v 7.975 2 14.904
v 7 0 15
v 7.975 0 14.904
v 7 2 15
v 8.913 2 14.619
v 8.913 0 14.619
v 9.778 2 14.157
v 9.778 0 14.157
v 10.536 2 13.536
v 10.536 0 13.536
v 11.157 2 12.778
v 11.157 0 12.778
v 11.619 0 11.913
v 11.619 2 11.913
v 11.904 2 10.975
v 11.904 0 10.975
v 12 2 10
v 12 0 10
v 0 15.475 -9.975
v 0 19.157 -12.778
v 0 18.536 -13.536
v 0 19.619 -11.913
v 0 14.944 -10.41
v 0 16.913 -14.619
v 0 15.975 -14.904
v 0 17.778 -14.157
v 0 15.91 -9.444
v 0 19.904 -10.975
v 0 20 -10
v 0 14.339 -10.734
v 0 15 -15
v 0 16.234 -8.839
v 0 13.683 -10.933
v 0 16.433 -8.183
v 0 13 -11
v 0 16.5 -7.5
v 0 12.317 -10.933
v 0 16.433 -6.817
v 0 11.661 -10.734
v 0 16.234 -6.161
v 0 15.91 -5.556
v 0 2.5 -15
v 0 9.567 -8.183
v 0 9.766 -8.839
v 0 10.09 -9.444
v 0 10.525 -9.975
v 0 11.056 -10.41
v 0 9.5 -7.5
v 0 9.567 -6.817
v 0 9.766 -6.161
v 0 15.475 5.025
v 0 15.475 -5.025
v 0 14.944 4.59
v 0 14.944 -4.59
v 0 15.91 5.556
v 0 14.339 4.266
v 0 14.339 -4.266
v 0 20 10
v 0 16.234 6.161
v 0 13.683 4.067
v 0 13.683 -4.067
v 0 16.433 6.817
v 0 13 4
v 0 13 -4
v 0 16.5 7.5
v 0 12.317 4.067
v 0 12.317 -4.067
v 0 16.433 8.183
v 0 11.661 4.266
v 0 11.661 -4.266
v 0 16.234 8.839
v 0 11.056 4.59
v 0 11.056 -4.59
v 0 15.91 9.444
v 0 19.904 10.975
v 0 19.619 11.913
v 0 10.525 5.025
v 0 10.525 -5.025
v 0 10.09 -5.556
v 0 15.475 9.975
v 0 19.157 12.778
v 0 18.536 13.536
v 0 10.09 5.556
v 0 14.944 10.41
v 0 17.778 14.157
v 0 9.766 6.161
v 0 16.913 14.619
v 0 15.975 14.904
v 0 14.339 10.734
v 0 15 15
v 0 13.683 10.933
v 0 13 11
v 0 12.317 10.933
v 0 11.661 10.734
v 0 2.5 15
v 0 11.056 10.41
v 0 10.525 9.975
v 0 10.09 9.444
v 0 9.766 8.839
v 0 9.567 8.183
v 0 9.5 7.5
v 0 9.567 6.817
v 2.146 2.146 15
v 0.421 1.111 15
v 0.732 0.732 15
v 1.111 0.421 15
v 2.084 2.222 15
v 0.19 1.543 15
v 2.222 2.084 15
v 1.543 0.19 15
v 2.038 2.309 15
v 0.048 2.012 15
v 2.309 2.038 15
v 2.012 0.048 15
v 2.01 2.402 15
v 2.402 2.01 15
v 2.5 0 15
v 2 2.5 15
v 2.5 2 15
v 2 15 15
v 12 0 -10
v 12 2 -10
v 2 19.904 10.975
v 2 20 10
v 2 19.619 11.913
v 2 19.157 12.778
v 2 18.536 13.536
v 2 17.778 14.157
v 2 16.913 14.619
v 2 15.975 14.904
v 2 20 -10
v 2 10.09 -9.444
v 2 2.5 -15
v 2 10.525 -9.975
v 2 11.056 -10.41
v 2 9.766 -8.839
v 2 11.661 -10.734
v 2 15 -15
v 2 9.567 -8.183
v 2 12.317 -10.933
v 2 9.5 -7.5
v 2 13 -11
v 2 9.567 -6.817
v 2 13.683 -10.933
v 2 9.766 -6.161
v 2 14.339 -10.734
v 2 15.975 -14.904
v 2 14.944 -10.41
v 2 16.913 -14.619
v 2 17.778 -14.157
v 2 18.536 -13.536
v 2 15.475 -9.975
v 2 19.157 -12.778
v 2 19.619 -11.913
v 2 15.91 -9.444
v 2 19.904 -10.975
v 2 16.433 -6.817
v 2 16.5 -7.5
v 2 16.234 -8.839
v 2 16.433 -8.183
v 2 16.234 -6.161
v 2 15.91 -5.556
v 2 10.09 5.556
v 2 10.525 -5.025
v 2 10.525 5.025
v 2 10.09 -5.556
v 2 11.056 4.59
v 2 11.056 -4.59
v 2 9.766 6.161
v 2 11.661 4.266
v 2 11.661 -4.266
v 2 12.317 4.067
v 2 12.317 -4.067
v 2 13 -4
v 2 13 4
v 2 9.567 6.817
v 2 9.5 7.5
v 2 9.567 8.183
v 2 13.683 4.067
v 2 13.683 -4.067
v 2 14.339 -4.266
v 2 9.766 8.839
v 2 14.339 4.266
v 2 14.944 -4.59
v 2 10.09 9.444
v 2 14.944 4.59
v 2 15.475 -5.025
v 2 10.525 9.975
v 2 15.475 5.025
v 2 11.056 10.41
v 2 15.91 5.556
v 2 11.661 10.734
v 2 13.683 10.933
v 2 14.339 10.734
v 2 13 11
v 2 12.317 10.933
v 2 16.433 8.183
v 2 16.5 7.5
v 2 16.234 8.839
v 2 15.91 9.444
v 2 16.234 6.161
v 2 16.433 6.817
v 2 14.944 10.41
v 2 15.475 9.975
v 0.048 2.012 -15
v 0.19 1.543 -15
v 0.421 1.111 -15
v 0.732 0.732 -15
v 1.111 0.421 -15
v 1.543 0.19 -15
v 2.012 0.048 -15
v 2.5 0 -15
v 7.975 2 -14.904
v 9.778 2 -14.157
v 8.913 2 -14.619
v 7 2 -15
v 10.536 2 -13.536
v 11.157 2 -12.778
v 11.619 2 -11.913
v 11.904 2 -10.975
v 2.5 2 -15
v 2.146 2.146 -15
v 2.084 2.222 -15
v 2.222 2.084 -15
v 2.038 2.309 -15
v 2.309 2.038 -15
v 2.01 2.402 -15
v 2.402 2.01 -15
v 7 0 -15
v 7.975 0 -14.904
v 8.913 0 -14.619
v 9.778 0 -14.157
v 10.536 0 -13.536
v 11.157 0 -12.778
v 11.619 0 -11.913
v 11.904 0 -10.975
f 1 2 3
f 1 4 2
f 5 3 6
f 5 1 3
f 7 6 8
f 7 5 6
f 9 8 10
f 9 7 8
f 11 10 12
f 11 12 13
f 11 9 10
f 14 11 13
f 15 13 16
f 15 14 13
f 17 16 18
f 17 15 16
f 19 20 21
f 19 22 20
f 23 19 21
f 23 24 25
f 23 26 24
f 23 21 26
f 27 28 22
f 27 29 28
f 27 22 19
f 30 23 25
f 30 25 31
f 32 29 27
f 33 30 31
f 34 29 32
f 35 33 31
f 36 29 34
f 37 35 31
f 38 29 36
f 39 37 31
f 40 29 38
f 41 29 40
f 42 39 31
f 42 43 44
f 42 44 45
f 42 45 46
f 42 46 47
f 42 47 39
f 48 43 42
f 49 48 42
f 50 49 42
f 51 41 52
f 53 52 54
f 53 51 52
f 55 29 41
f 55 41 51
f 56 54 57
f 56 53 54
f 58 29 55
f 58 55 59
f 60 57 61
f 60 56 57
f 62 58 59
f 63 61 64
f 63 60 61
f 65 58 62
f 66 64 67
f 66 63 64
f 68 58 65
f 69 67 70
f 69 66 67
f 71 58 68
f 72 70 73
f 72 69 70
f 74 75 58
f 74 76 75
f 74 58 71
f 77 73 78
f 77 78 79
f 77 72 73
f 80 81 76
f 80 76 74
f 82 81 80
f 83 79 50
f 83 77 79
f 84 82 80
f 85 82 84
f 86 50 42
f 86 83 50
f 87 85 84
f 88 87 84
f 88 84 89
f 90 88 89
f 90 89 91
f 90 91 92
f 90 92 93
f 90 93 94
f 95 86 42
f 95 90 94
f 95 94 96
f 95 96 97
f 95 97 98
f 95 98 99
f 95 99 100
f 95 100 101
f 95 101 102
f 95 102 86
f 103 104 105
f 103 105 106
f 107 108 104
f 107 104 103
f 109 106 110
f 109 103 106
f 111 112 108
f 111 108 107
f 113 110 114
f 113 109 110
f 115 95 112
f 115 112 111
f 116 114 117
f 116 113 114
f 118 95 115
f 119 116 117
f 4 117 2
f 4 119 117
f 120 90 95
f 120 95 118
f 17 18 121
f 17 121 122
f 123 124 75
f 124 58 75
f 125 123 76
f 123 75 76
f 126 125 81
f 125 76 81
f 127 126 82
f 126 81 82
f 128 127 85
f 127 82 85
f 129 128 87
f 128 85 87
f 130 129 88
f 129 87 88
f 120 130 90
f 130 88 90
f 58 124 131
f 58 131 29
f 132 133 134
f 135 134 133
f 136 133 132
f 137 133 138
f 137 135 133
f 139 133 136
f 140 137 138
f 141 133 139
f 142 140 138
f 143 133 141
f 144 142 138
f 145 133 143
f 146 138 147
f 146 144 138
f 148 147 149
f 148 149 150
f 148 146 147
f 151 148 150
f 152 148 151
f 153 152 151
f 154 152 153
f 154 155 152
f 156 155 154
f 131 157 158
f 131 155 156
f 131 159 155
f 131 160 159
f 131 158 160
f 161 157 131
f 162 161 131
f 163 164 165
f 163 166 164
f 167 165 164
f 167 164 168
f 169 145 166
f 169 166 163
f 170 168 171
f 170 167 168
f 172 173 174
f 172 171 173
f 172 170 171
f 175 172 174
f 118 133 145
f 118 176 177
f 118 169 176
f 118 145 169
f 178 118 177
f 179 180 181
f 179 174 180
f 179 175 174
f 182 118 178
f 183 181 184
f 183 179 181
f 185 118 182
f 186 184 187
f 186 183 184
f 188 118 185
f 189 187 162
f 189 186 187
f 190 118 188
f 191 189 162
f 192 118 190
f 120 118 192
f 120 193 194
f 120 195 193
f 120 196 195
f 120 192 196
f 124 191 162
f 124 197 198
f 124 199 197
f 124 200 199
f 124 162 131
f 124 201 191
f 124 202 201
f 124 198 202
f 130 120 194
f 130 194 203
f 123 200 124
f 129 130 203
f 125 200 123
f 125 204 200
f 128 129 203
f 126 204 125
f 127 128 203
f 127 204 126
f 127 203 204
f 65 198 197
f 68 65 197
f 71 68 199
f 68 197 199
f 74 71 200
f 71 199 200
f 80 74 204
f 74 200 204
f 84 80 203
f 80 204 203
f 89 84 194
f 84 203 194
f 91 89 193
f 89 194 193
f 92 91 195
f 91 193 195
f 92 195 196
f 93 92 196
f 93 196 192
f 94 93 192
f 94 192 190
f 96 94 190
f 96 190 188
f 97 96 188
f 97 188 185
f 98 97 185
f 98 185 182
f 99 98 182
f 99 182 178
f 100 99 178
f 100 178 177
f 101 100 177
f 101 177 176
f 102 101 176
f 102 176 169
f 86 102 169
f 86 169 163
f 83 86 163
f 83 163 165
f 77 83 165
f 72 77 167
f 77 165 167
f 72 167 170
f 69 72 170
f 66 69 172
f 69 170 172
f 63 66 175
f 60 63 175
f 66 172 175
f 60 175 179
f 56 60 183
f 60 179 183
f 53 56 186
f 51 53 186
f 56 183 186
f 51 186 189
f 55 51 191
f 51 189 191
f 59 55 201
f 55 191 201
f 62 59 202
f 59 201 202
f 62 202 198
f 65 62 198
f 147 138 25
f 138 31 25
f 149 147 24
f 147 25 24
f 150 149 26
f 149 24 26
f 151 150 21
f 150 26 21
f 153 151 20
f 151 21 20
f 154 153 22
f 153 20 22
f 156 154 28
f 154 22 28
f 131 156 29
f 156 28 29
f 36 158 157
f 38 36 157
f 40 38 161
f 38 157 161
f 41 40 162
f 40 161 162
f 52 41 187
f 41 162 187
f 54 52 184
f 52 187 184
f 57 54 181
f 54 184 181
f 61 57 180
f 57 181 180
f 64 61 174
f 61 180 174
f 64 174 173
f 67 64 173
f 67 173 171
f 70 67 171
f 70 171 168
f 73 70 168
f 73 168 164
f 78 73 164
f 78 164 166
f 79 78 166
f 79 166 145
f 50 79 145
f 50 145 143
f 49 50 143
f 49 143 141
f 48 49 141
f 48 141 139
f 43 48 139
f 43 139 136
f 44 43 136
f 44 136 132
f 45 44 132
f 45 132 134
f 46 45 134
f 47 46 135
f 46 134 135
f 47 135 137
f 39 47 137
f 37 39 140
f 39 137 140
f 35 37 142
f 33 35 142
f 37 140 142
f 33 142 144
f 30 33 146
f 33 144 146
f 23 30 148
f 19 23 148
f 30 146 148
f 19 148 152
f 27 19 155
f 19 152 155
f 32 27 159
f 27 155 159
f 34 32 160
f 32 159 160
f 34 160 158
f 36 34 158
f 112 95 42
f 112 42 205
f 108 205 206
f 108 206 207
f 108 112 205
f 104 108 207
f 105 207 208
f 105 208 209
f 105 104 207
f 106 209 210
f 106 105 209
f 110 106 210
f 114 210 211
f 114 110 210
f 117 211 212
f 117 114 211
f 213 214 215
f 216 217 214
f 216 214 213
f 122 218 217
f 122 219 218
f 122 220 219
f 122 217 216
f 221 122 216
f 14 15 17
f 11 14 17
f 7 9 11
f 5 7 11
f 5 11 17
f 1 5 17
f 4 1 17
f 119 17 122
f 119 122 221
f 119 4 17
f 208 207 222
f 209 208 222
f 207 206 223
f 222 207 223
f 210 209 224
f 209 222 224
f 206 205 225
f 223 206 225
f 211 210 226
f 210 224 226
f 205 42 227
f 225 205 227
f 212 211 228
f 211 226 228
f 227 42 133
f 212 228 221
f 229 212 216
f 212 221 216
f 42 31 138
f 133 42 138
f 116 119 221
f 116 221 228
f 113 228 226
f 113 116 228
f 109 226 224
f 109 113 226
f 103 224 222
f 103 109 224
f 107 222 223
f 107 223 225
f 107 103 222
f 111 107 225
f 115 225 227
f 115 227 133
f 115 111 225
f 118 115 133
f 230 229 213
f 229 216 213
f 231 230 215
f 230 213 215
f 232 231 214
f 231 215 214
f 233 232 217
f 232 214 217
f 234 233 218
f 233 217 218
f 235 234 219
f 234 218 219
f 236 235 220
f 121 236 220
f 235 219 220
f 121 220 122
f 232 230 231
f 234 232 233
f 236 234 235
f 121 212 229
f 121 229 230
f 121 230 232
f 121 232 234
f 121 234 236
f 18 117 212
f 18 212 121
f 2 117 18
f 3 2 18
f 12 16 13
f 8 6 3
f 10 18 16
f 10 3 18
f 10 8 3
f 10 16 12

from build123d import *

# Parameters (mm, degrees)
SM_BASE_FLANGE_1_DEPTH = 15
CUT_EXTRUDE_1_REACH    = 28.926
SKETCH_3_R             = 3.5
FILLET_1_R             = 5


# Sheet-metal steps are written as plain solids
with BuildPart() as part:
    # Sketch 1 → 基体-法兰1 (new, symmetric)
    with BuildSketch(Plane.XY):
        with BuildLine():
            Line((0, 20), (0, 2.5))
            ThreePointArc((0, 2.5), (0.732233047, 0.732233047), (2.5, 0))
            Line((2.5, 0), (12, 0))
            Line((12, 0), (12, 2))
            Line((12, 2), (2.5, 2))
            ThreePointArc((2.5, 2), (2.146446609, 2.146446609), (2, 2.5))
            Line((2, 2.5), (2, 20))
            Line((2, 20), (0, 20))
        make_face()
    extrude(amount=SM_BASE_FLANGE_1_DEPTH, both=True)

    # 草图3 → 切除-拉伸1 (cut, up to next)
    with BuildSketch(Plane(origin=(2, 0, 0), x_dir=(0, 0, -1), z_dir=(1, 0, 0)), mode=Mode.PRIVATE) as cut_extrude_1_sk1:
        with Locations(Location((-7.5, 13, 0), (0, 0, 90))):
            Circle(SKETCH_3_R)
    cut_extrude_1_tool1 = extrude(cut_extrude_1_sk1.sketch, amount=-CUT_EXTRUDE_1_REACH, mode=Mode.PRIVATE) & part.part
    # 草图3 → 切除-拉伸1 (cut, up to next)
    with BuildSketch(Plane(origin=(2, 0, 0), x_dir=(0, 0, -1), z_dir=(1, 0, 0)), mode=Mode.PRIVATE) as cut_extrude_1_sk2:
        with Locations(Location((7.5, 13, 0), (0, 0, 90))):
            Circle(SKETCH_3_R)
    cut_extrude_1_tool2 = extrude(cut_extrude_1_sk2.sketch, amount=-CUT_EXTRUDE_1_REACH, mode=Mode.PRIVATE) & part.part
    add(cut_extrude_1_tool1.solids().sort_by_distance((2, 13, 7.5))[0], mode=Mode.SUBTRACT)
    add(cut_extrude_1_tool2.solids().sort_by_distance((2, 13, -7.5))[0], mode=Mode.SUBTRACT)

    # 圆角1
    fillet_1_edges = [part.edges().sort_by_distance(p)[0] for p in [
        (1, 20, -15),
        (12, 1, -15),
        (1, 20, 15),
        (12, 1, 15),
    ]]
    fillet(fillet_1_edges, radius=FILLET_1_R)


solid = part.part
